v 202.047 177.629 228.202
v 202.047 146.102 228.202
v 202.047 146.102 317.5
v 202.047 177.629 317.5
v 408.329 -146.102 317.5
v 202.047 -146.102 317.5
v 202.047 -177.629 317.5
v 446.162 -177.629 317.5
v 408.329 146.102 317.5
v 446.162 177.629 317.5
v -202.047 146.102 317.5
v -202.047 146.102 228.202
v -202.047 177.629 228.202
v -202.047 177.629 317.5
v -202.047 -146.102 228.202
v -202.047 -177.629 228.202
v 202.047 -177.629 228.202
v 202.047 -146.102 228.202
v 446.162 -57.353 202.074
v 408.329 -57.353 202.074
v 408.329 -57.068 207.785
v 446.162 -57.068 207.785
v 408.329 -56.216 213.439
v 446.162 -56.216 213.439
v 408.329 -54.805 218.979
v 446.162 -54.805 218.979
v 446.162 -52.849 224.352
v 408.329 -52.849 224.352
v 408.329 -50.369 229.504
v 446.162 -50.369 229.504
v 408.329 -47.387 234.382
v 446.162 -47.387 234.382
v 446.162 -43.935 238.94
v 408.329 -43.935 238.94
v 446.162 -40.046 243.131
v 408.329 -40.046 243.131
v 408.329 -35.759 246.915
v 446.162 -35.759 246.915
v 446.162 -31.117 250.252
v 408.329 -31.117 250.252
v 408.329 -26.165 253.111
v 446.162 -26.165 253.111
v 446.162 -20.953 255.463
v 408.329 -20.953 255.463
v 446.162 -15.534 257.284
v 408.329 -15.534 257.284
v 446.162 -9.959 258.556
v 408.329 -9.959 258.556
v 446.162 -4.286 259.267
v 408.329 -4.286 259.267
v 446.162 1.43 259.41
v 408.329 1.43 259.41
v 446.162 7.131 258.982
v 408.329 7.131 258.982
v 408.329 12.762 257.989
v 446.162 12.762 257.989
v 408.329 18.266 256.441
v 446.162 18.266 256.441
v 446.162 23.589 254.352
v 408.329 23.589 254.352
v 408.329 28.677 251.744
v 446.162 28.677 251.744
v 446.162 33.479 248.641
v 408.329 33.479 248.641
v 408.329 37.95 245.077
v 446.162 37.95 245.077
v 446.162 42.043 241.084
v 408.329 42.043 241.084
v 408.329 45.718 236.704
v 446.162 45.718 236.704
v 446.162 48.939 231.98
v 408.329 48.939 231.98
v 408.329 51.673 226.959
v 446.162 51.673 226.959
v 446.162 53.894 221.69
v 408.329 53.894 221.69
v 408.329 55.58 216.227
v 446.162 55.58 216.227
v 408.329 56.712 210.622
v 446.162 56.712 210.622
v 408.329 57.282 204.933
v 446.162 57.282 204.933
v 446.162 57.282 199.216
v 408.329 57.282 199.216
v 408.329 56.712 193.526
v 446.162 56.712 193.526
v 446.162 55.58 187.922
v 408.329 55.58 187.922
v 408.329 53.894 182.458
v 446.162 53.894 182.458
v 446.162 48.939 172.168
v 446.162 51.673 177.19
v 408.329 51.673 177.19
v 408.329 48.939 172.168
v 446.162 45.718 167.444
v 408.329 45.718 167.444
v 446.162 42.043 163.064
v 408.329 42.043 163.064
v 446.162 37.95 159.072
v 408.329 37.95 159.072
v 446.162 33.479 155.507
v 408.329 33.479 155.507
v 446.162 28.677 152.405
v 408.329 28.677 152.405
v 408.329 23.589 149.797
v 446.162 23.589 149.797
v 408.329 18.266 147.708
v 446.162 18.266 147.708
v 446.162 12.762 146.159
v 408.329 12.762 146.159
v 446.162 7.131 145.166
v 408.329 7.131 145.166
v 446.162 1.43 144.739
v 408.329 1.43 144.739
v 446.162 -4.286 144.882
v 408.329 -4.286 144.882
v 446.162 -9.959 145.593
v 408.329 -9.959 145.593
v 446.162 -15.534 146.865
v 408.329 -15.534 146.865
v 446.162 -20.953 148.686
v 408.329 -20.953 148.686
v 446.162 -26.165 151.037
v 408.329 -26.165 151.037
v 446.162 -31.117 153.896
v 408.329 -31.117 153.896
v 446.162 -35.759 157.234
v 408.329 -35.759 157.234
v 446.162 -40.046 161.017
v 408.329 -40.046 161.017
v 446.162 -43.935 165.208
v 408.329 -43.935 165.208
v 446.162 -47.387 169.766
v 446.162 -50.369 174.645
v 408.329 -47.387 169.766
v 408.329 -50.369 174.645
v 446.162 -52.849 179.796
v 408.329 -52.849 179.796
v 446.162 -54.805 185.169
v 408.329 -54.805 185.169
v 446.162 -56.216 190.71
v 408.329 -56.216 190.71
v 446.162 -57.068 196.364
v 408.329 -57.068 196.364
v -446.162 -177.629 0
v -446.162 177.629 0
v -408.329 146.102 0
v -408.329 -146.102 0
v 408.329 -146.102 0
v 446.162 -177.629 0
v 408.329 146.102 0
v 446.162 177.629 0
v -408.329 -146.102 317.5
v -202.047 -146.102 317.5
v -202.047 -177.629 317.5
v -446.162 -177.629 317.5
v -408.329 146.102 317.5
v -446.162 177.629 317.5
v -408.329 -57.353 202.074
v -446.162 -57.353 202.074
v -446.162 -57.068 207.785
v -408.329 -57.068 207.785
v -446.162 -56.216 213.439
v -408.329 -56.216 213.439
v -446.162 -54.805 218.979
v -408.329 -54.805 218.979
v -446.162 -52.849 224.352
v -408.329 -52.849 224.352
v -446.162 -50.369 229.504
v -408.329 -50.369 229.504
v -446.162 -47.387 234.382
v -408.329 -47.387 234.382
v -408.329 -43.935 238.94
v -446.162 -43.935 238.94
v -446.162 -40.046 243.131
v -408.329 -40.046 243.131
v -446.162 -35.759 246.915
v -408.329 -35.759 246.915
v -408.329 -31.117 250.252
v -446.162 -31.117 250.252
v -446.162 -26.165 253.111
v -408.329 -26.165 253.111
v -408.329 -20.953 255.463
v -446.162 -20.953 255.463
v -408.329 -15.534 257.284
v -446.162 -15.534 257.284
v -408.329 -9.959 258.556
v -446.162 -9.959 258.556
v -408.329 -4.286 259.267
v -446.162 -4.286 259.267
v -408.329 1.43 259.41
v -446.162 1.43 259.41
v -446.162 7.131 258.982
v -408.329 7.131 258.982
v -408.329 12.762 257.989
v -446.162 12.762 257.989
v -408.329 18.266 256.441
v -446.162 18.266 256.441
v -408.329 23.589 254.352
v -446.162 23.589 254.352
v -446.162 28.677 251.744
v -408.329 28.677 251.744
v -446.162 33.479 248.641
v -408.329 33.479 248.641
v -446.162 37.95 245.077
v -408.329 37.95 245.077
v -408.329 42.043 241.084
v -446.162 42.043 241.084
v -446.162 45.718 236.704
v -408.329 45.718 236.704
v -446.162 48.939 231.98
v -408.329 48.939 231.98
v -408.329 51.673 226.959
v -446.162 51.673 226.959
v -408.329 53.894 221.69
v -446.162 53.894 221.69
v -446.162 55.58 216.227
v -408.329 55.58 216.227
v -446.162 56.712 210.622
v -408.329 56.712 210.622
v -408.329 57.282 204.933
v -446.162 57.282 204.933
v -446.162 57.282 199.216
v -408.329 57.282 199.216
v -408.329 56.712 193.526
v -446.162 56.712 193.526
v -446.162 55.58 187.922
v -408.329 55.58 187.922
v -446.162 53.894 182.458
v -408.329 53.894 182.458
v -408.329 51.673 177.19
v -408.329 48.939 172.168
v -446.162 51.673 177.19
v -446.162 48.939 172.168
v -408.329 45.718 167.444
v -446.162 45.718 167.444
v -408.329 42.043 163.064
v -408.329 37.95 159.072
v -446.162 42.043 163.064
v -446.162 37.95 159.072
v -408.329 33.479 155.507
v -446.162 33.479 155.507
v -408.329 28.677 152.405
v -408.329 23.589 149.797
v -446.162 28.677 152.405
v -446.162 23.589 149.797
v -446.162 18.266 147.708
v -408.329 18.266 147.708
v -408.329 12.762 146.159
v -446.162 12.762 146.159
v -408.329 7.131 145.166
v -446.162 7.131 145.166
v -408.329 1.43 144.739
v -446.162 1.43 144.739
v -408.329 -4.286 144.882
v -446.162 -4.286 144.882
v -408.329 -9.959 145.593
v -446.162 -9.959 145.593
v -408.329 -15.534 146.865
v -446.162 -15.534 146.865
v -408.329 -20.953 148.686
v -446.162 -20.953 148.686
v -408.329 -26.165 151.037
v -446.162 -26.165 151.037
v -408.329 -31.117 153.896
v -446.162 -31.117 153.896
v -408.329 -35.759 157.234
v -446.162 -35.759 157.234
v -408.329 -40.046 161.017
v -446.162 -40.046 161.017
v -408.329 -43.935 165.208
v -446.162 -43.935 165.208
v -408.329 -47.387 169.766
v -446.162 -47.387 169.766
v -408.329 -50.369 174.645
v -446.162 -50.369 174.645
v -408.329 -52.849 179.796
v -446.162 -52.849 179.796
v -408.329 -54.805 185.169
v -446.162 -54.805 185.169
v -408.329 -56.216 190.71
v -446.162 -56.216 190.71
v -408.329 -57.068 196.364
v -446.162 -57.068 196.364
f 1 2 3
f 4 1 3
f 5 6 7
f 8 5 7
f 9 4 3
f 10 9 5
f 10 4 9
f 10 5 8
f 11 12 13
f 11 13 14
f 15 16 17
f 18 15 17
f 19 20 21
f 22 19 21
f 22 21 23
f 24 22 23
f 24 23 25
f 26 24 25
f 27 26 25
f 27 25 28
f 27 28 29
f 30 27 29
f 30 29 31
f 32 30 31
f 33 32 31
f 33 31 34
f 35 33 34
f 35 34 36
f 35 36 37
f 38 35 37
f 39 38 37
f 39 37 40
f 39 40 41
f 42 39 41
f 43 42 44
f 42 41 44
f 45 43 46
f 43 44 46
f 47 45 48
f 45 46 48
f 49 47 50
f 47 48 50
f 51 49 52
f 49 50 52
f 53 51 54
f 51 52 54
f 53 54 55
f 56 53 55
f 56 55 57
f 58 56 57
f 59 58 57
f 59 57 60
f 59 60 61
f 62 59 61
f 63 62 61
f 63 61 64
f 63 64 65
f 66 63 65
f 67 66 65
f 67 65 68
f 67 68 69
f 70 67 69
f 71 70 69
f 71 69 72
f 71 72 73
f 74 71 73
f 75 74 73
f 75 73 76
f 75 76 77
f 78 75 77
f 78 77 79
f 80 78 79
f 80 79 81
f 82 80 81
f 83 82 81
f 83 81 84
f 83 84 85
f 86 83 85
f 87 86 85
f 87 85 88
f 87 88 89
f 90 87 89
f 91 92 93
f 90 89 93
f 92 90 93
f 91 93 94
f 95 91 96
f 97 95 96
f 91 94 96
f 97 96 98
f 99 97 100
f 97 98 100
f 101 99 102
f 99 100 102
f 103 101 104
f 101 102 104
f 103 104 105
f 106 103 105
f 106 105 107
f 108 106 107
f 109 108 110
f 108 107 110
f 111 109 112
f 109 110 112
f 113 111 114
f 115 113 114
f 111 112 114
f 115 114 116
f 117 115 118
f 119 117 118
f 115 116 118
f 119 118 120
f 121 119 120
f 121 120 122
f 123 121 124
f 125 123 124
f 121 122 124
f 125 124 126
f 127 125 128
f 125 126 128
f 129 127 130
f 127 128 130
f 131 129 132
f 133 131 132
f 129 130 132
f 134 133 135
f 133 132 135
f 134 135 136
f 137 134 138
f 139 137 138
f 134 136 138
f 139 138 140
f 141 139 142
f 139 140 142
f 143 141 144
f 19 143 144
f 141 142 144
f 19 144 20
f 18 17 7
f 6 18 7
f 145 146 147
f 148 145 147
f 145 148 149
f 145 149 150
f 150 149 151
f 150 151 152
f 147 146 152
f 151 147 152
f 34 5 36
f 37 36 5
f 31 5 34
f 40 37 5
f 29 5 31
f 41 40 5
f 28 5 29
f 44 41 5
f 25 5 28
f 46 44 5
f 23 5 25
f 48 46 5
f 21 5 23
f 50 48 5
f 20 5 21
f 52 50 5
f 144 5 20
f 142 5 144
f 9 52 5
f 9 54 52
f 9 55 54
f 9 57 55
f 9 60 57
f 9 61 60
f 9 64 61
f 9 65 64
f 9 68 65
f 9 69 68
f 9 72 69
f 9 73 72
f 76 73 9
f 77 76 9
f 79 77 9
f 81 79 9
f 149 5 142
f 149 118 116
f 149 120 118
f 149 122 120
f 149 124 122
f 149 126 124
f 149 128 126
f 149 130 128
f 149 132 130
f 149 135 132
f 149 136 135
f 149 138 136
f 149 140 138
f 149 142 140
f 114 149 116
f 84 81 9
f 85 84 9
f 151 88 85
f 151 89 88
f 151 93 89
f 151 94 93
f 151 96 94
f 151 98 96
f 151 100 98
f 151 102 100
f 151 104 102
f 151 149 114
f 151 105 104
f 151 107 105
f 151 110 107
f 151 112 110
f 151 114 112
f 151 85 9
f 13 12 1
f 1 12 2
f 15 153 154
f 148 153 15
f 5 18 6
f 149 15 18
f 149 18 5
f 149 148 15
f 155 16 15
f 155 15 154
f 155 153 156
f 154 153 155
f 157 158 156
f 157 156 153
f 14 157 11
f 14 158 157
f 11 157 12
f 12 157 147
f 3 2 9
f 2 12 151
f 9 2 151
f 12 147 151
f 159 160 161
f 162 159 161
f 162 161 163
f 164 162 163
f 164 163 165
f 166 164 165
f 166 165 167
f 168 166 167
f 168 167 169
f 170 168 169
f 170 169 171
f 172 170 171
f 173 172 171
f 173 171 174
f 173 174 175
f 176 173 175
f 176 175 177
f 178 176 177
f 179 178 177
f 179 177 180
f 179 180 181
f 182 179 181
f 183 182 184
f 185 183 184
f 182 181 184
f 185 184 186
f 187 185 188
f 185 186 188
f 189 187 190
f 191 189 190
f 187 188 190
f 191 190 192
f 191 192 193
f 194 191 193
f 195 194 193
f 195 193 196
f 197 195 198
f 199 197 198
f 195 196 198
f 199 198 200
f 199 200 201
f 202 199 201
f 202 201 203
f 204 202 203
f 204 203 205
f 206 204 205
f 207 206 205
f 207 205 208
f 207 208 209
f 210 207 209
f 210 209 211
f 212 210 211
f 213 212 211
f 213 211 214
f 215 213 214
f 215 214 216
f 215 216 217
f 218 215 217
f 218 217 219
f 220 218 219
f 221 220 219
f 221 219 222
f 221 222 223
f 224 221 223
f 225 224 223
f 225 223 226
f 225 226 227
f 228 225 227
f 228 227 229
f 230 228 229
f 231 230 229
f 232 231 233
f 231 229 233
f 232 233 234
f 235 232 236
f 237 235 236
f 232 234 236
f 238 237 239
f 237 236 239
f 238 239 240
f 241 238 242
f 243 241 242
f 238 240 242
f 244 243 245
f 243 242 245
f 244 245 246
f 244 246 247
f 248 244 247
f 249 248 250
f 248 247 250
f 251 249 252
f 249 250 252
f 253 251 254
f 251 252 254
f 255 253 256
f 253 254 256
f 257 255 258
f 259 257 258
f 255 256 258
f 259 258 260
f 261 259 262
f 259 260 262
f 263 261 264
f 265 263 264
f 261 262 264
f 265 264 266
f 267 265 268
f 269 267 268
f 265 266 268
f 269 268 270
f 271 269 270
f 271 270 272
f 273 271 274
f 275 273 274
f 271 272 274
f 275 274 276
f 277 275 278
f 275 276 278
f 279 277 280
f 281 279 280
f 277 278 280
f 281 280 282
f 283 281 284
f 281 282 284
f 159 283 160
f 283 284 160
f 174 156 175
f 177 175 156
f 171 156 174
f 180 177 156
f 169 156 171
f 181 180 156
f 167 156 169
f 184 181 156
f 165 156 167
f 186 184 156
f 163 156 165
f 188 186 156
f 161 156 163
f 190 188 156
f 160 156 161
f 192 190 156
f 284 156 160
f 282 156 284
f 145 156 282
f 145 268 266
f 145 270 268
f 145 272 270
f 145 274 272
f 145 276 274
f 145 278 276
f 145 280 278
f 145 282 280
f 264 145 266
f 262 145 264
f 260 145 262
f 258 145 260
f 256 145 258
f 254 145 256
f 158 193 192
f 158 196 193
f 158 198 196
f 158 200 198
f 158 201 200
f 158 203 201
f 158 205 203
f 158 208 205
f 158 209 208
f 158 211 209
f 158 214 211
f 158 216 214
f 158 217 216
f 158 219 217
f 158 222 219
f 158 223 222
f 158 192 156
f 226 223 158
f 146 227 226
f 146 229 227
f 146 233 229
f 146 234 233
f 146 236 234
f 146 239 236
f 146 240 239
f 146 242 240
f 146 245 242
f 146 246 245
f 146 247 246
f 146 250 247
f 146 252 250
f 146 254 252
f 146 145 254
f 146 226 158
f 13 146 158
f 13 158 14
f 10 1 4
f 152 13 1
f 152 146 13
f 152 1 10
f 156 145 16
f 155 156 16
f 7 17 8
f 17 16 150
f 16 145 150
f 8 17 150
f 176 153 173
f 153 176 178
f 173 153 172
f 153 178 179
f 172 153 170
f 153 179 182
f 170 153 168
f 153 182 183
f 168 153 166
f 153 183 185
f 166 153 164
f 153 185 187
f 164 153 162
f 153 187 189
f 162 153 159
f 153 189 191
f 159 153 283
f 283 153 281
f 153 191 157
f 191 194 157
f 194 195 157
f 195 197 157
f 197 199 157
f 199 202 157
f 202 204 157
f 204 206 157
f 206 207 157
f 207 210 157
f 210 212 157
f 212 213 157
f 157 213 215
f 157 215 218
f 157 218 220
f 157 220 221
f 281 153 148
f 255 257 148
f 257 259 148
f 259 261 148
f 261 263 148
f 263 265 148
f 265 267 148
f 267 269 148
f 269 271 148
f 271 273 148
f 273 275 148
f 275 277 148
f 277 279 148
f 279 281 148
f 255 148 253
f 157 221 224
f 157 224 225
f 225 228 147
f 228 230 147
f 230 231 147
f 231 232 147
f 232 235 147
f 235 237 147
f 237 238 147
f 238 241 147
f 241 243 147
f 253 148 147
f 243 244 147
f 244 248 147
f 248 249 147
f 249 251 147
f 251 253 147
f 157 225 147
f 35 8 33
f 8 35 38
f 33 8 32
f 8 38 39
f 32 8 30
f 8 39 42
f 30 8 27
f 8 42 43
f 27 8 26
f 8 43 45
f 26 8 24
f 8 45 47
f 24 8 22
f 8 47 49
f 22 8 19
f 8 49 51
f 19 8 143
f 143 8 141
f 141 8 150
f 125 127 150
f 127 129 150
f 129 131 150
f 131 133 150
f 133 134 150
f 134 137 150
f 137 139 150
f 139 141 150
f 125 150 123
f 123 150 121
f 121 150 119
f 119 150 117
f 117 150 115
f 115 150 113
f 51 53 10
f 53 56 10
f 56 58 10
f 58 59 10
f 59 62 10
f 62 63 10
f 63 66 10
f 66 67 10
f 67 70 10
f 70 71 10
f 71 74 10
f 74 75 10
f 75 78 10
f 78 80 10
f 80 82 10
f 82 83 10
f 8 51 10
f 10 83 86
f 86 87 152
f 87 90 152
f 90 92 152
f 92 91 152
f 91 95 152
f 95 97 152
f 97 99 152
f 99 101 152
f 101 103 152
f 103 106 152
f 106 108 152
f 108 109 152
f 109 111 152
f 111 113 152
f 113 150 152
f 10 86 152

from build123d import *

# Parameters (mm, degrees)
F0_W     = 892.323136
F0_H     = 355.258762
F0_W_2   = 816.658438
F0_H_2   = 292.204798
F1_DEPTH = 317.5
F2_W     = 404.093236
F2_H     = 178.596606
F3_DEPTH = 355.259763
F4_R     = 57.353044
F5_DEPTH = 892.324136


with BuildPart() as f1:
    # F0 (on Top) → F1 (new body)
    with BuildSketch(Plane.XY):
        Rectangle(F0_W, F0_H)
        Rectangle(F0_W_2, F0_H_2, mode=Mode.SUBTRACT)
    extrude(amount=F1_DEPTH)

    # F2 (on face) → F3 (cut, through all)
    with BuildSketch(Plane.XZ.offset(177.629381)):
        with Locations((0, 317.5)):
            Rectangle(F2_W, F2_H)
    extrude(amount=-F3_DEPTH, mode=Mode.SUBTRACT)

    # F4 (on face) → F5 (cut, through all)
    with BuildSketch(Plane(origin=(-446.161568, 0, 0), x_dir=(0, -1, 0), z_dir=(-1, 0, 0))):
        with Locations((0, 202.074319)):
            Circle(F4_R)
    extrude(amount=-F5_DEPTH, mode=Mode.SUBTRACT)


solid = f1.part
